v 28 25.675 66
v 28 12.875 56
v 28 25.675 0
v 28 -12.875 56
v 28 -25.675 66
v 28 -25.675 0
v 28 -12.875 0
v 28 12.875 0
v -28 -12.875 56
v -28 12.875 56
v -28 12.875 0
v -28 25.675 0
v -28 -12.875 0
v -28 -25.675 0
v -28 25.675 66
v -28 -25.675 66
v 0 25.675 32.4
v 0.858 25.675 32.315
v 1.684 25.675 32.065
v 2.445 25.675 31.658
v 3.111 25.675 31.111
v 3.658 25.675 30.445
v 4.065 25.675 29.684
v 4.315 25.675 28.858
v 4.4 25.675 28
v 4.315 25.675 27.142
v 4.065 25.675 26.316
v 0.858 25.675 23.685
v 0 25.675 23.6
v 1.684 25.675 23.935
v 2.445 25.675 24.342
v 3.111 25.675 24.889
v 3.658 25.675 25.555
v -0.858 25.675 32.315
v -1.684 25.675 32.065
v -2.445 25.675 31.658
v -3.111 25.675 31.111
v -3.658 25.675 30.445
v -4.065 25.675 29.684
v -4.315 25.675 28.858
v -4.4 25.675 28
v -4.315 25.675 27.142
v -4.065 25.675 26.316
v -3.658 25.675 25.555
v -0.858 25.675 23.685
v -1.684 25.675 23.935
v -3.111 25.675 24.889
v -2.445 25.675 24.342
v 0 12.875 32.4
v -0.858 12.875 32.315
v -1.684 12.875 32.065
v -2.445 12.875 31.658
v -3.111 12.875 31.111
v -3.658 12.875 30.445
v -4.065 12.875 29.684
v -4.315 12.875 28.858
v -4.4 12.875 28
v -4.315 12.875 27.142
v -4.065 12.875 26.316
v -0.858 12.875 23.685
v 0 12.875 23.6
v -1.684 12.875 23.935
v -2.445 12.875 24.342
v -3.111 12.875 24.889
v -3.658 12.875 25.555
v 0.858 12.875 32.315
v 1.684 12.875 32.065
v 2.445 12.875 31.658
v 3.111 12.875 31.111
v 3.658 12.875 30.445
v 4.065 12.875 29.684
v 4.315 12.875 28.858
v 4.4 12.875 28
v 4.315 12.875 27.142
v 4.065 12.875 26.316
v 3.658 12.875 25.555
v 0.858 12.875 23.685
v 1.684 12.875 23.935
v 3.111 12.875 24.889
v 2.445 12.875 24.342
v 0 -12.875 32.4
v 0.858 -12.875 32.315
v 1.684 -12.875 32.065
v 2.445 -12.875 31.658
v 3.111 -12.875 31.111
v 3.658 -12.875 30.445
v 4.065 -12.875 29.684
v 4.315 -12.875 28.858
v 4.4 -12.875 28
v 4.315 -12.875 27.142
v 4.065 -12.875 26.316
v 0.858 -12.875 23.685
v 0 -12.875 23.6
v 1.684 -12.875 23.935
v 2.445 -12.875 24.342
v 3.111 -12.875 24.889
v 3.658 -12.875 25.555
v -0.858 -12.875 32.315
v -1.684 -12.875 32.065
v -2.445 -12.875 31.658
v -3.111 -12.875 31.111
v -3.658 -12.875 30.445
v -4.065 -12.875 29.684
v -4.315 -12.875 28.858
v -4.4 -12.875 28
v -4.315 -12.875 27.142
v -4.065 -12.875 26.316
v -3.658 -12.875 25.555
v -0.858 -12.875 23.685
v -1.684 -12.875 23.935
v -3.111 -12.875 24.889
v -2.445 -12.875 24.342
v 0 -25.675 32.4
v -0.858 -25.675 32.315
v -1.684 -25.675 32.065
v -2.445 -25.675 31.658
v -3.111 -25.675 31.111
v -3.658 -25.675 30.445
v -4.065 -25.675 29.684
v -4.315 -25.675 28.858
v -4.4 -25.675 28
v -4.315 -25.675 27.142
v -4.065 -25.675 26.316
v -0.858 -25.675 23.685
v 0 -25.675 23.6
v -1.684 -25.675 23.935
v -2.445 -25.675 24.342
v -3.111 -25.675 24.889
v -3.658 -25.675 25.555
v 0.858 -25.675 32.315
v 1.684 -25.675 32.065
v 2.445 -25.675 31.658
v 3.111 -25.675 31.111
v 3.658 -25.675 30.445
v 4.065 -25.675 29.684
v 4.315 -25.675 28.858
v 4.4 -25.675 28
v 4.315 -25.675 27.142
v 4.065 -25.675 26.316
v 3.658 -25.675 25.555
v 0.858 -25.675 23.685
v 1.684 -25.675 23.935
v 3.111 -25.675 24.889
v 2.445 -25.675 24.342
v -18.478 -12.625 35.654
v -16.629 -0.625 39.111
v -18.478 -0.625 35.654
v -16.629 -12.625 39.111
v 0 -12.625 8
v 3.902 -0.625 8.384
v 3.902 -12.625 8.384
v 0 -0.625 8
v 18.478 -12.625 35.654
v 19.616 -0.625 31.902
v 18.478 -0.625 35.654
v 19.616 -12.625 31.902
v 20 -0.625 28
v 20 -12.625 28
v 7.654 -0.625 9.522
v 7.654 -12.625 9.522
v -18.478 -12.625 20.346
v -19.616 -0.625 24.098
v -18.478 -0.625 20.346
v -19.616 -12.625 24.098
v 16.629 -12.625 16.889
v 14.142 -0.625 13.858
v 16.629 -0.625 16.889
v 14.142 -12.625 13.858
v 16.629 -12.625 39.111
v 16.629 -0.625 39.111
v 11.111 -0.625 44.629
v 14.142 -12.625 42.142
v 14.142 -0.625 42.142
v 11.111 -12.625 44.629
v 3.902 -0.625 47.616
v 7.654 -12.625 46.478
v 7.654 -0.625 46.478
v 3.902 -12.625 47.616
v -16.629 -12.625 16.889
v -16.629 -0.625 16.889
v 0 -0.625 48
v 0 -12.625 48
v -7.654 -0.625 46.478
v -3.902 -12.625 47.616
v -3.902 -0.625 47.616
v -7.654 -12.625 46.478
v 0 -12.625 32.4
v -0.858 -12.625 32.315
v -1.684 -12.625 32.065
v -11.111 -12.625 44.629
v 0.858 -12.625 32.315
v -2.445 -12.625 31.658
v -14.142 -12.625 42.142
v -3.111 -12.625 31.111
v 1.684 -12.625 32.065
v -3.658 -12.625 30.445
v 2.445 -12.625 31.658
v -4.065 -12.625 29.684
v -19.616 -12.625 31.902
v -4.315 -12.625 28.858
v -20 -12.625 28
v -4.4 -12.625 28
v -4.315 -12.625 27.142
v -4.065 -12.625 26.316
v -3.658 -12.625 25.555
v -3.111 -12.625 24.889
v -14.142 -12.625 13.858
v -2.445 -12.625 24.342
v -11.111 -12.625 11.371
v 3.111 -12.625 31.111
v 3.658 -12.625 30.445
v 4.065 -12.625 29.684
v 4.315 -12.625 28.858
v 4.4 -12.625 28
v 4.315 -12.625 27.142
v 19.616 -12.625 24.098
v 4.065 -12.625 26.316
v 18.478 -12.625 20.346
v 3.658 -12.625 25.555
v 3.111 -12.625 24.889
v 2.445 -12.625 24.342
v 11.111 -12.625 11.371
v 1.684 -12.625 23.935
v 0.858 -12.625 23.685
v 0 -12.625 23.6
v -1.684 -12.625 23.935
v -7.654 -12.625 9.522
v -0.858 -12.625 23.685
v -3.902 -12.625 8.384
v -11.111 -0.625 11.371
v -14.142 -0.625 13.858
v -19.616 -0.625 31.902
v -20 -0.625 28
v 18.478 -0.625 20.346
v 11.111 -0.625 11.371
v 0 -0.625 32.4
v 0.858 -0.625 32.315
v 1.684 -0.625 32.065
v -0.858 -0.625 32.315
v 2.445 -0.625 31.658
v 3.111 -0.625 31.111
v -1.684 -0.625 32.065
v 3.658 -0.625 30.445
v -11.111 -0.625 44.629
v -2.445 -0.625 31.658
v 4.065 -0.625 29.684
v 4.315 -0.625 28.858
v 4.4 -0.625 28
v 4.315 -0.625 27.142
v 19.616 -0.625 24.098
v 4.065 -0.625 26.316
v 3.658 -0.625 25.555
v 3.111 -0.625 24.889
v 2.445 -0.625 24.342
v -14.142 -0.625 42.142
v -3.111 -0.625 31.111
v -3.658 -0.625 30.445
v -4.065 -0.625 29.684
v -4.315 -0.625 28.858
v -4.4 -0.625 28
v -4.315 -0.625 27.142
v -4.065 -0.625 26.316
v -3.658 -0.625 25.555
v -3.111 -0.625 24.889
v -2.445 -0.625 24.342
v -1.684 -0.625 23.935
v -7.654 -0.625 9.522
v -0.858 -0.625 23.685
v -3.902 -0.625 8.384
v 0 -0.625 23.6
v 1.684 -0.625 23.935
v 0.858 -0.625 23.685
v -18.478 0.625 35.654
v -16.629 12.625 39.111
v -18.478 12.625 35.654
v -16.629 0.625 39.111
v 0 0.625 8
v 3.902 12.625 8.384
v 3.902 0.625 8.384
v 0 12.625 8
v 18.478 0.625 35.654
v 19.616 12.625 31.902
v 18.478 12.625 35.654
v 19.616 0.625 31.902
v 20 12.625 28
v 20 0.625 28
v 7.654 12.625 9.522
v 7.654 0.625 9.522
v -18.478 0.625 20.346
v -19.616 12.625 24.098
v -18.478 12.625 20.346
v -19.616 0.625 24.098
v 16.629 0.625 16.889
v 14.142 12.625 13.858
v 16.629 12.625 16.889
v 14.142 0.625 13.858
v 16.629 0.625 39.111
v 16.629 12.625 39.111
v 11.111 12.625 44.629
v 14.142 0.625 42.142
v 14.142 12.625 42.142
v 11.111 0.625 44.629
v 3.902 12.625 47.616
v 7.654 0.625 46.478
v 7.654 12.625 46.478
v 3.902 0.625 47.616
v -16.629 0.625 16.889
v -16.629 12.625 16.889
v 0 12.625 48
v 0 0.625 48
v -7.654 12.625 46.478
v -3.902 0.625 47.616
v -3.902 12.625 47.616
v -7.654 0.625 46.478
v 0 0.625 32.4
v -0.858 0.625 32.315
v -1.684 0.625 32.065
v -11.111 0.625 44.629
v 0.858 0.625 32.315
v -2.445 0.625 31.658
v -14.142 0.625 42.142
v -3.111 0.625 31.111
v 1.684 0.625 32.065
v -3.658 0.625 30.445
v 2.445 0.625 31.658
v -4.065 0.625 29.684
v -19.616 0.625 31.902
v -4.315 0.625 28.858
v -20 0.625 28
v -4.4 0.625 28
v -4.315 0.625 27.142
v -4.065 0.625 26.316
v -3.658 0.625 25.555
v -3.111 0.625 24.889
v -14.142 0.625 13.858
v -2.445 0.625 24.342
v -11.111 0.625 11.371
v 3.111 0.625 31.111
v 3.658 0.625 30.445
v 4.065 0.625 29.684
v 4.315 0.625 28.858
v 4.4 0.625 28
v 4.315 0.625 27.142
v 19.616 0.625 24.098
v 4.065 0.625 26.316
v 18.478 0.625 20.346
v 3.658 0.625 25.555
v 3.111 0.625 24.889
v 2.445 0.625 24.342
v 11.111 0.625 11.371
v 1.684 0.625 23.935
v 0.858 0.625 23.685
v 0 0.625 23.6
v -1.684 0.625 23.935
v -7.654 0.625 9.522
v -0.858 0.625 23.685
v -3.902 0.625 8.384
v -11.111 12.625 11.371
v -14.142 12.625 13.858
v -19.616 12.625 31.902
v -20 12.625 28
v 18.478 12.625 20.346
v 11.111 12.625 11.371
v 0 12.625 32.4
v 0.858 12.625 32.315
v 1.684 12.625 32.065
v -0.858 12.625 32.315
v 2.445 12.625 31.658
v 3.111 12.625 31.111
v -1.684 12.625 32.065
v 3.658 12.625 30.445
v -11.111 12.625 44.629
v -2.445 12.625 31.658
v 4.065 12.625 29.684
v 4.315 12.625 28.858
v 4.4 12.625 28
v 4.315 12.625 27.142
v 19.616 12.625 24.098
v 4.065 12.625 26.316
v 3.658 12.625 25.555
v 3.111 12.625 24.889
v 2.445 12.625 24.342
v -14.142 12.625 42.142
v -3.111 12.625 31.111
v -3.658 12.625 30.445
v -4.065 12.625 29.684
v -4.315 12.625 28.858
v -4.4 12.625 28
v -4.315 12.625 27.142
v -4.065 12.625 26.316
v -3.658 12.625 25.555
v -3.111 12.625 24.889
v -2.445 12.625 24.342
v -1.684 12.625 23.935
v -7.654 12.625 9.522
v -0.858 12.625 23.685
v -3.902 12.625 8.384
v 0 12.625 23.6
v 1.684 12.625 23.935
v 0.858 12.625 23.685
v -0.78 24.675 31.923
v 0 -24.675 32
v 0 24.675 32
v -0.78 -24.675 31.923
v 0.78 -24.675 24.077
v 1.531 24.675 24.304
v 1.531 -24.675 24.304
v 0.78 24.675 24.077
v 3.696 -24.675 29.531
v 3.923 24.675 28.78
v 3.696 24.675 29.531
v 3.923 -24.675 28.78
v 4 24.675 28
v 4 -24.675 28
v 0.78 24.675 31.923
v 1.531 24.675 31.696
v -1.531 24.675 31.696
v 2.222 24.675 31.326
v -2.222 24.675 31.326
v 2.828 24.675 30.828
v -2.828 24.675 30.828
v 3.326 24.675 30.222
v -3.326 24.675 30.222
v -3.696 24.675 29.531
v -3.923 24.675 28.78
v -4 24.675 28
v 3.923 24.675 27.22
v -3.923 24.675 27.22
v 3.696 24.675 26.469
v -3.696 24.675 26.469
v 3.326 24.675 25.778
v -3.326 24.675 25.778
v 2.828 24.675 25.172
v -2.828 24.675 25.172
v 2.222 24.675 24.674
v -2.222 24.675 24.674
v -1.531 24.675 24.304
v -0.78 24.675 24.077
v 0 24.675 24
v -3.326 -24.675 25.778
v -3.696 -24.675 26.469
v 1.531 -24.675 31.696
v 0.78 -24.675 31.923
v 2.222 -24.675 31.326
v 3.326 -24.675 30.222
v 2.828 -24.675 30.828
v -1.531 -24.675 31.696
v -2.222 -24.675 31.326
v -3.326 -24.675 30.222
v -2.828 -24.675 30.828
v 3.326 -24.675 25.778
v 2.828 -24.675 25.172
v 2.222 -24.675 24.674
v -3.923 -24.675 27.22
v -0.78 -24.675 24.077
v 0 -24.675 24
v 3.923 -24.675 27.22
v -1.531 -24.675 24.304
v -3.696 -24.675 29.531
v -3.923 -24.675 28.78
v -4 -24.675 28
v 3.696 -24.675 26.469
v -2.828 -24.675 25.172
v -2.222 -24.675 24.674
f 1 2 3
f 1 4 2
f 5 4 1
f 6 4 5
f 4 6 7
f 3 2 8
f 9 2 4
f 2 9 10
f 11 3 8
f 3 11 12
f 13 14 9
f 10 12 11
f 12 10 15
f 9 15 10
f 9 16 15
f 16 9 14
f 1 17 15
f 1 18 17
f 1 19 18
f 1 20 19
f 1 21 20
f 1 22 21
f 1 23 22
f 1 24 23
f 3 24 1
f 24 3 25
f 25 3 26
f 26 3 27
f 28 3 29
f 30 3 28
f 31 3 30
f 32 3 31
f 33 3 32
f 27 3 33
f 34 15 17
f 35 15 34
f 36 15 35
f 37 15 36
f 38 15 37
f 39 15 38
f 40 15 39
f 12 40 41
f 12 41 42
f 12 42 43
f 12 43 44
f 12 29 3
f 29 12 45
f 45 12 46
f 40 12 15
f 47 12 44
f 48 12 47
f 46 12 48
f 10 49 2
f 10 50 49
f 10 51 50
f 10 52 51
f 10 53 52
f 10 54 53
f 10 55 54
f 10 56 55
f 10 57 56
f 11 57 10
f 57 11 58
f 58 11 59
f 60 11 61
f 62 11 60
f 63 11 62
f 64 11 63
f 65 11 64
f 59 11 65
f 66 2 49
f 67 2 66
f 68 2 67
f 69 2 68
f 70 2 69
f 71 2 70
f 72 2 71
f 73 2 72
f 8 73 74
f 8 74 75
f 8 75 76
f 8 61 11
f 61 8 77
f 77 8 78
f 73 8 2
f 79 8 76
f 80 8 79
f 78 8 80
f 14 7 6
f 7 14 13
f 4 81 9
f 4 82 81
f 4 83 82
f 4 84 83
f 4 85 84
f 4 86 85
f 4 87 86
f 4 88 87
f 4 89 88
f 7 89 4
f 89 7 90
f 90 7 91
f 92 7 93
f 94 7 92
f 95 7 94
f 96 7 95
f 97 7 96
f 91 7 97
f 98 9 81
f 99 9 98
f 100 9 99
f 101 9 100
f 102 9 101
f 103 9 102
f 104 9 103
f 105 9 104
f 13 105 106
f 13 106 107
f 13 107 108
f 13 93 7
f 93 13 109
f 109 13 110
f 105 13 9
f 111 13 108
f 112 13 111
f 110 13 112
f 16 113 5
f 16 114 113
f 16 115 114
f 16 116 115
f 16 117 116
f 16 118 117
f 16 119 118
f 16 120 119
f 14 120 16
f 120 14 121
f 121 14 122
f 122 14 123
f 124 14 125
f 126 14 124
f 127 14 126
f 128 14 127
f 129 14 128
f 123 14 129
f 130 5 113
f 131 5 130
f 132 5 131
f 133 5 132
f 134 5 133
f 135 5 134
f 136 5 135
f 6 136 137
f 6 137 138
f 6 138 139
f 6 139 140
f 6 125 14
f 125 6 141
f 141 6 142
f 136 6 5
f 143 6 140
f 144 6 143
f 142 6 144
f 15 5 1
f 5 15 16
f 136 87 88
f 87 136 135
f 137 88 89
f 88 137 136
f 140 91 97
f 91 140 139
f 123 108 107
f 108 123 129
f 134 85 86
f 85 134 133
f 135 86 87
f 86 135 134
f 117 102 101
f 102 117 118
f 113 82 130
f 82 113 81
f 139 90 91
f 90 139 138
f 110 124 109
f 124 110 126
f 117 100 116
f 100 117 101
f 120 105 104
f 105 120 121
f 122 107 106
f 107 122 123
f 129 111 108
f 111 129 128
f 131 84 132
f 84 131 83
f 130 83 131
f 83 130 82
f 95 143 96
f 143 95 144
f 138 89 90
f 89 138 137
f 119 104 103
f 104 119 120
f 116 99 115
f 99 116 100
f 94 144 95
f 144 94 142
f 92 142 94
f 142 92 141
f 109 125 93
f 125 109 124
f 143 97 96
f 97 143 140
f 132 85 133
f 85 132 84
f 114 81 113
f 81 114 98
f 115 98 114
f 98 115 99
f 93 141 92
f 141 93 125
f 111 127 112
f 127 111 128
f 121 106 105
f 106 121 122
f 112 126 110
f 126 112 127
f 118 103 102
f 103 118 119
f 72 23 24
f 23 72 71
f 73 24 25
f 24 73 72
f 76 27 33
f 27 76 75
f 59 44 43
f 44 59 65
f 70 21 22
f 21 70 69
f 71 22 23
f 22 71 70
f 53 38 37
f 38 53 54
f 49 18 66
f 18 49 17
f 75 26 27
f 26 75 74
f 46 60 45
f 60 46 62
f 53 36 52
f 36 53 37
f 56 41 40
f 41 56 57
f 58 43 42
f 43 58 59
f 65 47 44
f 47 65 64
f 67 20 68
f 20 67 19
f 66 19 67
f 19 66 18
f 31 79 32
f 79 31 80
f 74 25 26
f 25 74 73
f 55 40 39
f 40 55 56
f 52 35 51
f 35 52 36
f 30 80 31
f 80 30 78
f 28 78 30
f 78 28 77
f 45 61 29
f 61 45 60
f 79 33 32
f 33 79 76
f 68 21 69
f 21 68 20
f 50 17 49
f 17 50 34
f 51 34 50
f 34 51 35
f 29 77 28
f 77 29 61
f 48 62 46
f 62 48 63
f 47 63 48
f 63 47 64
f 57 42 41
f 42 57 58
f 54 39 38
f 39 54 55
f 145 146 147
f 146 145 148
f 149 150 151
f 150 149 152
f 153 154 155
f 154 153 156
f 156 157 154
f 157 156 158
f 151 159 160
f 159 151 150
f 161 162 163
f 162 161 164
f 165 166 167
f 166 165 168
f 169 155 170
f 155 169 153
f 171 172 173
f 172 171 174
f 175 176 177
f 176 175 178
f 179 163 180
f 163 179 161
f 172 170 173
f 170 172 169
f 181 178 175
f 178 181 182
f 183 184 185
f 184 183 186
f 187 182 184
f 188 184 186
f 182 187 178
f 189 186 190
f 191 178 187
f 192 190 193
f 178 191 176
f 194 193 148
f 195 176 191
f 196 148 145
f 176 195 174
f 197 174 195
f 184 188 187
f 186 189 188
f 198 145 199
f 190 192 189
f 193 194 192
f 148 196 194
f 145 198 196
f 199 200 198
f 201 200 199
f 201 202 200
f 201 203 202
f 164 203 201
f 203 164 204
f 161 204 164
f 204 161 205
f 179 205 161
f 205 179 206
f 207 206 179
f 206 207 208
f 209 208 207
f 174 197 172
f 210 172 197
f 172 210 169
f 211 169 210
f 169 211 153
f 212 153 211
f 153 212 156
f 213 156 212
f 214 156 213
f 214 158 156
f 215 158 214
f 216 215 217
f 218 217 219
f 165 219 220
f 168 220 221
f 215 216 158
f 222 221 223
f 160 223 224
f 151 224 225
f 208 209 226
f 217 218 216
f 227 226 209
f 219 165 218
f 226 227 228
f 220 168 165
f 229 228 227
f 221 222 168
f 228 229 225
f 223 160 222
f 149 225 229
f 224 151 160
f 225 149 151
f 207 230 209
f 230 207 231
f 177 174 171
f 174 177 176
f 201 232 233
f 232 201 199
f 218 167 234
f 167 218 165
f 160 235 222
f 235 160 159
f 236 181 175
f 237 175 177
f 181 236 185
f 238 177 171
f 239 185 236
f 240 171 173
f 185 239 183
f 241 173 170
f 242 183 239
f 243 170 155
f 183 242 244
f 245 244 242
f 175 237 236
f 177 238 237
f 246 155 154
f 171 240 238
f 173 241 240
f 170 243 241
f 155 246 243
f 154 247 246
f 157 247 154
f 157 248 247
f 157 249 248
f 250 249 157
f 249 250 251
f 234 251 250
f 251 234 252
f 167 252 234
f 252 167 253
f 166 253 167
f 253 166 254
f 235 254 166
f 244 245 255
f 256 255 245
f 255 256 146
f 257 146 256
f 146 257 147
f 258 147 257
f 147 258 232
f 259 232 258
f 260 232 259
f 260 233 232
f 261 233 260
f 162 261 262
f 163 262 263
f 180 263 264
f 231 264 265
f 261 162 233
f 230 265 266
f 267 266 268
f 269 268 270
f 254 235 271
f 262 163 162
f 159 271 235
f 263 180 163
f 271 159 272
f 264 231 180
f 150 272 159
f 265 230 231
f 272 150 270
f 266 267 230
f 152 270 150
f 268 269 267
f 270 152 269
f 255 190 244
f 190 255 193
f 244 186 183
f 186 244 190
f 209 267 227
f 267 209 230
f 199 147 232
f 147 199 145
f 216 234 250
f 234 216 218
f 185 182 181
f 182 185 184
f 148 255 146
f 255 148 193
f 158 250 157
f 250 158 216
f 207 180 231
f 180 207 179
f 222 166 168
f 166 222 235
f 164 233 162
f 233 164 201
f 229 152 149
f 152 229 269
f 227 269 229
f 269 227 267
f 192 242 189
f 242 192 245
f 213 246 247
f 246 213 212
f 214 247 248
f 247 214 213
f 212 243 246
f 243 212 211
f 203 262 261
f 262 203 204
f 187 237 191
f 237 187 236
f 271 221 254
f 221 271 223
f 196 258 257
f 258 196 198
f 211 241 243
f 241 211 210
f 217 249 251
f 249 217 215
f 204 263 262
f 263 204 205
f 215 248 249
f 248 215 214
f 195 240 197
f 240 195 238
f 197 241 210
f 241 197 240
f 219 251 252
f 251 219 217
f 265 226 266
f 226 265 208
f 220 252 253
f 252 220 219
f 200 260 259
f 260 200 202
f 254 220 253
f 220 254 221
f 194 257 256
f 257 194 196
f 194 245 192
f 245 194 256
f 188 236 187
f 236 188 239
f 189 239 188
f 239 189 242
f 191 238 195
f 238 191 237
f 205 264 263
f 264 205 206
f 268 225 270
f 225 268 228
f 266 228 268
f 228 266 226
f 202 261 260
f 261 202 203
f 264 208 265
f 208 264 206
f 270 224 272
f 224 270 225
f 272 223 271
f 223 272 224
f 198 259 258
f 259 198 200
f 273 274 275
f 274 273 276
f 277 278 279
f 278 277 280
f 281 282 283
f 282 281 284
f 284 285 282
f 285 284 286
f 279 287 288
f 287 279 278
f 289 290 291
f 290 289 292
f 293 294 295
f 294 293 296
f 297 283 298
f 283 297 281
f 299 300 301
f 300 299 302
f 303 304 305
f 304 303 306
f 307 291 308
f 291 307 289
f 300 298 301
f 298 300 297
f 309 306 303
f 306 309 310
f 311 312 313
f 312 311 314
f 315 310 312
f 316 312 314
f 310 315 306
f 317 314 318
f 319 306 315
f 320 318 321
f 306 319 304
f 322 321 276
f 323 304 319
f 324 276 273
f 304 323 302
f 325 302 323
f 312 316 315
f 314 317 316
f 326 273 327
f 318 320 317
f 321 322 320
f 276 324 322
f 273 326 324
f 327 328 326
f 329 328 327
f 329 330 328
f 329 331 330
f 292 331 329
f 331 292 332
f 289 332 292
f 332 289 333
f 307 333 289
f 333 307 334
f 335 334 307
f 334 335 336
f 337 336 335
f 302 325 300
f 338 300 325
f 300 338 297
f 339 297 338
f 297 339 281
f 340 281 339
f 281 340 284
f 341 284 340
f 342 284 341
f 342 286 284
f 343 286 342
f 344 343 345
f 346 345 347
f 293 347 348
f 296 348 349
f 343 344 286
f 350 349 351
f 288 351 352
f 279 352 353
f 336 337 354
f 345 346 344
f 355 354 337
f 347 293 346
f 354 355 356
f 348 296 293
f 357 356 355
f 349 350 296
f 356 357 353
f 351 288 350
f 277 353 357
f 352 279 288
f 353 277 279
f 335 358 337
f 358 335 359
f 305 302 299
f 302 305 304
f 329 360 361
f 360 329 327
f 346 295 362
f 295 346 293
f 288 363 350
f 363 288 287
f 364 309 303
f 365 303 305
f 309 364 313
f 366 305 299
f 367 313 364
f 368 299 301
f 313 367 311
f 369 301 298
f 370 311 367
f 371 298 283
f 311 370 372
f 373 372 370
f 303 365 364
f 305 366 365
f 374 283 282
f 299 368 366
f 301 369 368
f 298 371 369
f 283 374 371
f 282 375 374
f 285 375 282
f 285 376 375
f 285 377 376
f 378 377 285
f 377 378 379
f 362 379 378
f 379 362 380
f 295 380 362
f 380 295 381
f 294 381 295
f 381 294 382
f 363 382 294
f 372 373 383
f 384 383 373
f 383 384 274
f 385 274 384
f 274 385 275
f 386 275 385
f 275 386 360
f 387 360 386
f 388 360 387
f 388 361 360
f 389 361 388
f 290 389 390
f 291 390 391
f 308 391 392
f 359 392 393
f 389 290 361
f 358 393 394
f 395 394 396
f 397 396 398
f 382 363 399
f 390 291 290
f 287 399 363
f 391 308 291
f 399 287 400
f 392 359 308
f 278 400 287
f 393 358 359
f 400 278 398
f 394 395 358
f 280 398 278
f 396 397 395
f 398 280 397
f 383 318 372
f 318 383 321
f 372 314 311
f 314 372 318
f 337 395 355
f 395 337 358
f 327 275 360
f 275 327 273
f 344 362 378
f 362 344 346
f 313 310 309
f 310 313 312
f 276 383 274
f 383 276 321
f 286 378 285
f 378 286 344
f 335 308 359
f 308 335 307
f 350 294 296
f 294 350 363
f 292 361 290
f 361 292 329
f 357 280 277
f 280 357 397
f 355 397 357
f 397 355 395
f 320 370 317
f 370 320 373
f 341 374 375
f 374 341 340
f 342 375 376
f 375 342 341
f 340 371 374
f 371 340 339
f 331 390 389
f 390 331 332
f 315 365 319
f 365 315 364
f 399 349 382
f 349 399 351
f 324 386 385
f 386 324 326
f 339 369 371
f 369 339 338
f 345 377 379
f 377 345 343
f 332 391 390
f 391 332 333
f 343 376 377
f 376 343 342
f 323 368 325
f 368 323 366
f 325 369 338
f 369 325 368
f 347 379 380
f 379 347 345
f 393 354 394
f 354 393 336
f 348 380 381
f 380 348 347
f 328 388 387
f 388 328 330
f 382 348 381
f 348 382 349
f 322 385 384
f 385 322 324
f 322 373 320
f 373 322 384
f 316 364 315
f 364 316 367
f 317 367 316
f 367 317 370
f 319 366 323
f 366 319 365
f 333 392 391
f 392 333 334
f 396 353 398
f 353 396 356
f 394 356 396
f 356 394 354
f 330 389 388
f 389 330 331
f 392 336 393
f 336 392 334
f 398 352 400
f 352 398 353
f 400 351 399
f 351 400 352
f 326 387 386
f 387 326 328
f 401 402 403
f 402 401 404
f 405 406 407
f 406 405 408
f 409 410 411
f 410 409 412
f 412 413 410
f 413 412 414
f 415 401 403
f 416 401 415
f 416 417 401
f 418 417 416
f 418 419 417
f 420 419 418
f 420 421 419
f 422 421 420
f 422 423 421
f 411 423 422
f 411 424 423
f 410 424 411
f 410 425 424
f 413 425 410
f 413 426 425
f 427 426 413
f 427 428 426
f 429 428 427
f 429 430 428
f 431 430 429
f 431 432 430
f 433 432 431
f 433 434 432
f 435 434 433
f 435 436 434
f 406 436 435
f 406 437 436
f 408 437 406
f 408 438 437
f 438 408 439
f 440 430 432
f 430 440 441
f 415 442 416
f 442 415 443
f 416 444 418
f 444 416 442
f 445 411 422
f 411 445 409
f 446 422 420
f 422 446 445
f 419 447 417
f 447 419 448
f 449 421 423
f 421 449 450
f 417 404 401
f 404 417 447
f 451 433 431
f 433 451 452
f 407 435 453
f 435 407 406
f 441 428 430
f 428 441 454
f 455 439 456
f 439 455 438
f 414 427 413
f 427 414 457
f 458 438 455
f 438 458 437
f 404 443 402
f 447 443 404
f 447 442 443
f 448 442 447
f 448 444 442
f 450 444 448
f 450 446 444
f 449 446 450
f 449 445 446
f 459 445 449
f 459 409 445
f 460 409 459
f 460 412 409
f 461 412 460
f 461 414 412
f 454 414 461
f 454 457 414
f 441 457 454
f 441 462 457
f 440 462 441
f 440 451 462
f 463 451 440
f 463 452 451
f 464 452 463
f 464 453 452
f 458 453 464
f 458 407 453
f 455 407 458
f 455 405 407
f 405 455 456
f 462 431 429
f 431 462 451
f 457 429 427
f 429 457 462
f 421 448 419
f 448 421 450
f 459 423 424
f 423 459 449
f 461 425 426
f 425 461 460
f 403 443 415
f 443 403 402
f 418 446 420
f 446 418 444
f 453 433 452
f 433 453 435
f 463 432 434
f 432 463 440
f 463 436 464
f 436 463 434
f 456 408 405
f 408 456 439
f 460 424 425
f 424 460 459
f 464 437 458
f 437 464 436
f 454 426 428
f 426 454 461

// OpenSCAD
$fn = 32;

// ------------------------------------------------------------------------
// Trolley wheel set: wheels d40, fork 56 mm tall
// Every part is its own module, assembly() places every instance.
// ------------------------------------------------------------------------

// --- part 1 ---
module trolley_fork() {
  difference() {
    union() {
      translate([-28, 12.875, 0]) cube([56, 12.8, 56]);
      translate([-28, -25.675, 0]) cube([56, 12.8, 56]);
      translate([-28, -25.675, 56]) cube([56, 51.35, 10]);
    }
    translate([0, -19.275, 28]) rotate([90, 0, 0]) cylinder(h = 14.8, d = 8.8, center = true);
    translate([0, 19.275, 28]) rotate([90, 0, 0]) cylinder(h = 14.8, d = 8.8, center = true);
  }
}

// --- part 2 ---
module trolley_wheel() {
  difference() {
      translate([0, 0, 0]) cylinder(h = 12, d = 40);
      translate([0, 0, -1]) cylinder(h = 14, d = 8.8);
    }
}

// --- part 3 ---
module trolley_axle() {
  translate([0, 0, -24.675]) cylinder(h = 49.35, d = 8);
}

// --- assembly ---
module assembly() {
  color([0.80, 0.24, 0.20]) translate([0, 0, 0]) rotate([0, 0, 0]) trolley_fork();
  color([0.20, 0.45, 0.75]) translate([0, -0.625, 28]) rotate([90, 0, 0]) trolley_wheel();
  color([0.25, 0.62, 0.32]) translate([0, 12.625, 28]) rotate([90, 0, 0]) trolley_wheel();
  color([0.92, 0.70, 0.18]) translate([0, 0, 28]) rotate([90, 0, 0]) trolley_axle();
}

assembly();
